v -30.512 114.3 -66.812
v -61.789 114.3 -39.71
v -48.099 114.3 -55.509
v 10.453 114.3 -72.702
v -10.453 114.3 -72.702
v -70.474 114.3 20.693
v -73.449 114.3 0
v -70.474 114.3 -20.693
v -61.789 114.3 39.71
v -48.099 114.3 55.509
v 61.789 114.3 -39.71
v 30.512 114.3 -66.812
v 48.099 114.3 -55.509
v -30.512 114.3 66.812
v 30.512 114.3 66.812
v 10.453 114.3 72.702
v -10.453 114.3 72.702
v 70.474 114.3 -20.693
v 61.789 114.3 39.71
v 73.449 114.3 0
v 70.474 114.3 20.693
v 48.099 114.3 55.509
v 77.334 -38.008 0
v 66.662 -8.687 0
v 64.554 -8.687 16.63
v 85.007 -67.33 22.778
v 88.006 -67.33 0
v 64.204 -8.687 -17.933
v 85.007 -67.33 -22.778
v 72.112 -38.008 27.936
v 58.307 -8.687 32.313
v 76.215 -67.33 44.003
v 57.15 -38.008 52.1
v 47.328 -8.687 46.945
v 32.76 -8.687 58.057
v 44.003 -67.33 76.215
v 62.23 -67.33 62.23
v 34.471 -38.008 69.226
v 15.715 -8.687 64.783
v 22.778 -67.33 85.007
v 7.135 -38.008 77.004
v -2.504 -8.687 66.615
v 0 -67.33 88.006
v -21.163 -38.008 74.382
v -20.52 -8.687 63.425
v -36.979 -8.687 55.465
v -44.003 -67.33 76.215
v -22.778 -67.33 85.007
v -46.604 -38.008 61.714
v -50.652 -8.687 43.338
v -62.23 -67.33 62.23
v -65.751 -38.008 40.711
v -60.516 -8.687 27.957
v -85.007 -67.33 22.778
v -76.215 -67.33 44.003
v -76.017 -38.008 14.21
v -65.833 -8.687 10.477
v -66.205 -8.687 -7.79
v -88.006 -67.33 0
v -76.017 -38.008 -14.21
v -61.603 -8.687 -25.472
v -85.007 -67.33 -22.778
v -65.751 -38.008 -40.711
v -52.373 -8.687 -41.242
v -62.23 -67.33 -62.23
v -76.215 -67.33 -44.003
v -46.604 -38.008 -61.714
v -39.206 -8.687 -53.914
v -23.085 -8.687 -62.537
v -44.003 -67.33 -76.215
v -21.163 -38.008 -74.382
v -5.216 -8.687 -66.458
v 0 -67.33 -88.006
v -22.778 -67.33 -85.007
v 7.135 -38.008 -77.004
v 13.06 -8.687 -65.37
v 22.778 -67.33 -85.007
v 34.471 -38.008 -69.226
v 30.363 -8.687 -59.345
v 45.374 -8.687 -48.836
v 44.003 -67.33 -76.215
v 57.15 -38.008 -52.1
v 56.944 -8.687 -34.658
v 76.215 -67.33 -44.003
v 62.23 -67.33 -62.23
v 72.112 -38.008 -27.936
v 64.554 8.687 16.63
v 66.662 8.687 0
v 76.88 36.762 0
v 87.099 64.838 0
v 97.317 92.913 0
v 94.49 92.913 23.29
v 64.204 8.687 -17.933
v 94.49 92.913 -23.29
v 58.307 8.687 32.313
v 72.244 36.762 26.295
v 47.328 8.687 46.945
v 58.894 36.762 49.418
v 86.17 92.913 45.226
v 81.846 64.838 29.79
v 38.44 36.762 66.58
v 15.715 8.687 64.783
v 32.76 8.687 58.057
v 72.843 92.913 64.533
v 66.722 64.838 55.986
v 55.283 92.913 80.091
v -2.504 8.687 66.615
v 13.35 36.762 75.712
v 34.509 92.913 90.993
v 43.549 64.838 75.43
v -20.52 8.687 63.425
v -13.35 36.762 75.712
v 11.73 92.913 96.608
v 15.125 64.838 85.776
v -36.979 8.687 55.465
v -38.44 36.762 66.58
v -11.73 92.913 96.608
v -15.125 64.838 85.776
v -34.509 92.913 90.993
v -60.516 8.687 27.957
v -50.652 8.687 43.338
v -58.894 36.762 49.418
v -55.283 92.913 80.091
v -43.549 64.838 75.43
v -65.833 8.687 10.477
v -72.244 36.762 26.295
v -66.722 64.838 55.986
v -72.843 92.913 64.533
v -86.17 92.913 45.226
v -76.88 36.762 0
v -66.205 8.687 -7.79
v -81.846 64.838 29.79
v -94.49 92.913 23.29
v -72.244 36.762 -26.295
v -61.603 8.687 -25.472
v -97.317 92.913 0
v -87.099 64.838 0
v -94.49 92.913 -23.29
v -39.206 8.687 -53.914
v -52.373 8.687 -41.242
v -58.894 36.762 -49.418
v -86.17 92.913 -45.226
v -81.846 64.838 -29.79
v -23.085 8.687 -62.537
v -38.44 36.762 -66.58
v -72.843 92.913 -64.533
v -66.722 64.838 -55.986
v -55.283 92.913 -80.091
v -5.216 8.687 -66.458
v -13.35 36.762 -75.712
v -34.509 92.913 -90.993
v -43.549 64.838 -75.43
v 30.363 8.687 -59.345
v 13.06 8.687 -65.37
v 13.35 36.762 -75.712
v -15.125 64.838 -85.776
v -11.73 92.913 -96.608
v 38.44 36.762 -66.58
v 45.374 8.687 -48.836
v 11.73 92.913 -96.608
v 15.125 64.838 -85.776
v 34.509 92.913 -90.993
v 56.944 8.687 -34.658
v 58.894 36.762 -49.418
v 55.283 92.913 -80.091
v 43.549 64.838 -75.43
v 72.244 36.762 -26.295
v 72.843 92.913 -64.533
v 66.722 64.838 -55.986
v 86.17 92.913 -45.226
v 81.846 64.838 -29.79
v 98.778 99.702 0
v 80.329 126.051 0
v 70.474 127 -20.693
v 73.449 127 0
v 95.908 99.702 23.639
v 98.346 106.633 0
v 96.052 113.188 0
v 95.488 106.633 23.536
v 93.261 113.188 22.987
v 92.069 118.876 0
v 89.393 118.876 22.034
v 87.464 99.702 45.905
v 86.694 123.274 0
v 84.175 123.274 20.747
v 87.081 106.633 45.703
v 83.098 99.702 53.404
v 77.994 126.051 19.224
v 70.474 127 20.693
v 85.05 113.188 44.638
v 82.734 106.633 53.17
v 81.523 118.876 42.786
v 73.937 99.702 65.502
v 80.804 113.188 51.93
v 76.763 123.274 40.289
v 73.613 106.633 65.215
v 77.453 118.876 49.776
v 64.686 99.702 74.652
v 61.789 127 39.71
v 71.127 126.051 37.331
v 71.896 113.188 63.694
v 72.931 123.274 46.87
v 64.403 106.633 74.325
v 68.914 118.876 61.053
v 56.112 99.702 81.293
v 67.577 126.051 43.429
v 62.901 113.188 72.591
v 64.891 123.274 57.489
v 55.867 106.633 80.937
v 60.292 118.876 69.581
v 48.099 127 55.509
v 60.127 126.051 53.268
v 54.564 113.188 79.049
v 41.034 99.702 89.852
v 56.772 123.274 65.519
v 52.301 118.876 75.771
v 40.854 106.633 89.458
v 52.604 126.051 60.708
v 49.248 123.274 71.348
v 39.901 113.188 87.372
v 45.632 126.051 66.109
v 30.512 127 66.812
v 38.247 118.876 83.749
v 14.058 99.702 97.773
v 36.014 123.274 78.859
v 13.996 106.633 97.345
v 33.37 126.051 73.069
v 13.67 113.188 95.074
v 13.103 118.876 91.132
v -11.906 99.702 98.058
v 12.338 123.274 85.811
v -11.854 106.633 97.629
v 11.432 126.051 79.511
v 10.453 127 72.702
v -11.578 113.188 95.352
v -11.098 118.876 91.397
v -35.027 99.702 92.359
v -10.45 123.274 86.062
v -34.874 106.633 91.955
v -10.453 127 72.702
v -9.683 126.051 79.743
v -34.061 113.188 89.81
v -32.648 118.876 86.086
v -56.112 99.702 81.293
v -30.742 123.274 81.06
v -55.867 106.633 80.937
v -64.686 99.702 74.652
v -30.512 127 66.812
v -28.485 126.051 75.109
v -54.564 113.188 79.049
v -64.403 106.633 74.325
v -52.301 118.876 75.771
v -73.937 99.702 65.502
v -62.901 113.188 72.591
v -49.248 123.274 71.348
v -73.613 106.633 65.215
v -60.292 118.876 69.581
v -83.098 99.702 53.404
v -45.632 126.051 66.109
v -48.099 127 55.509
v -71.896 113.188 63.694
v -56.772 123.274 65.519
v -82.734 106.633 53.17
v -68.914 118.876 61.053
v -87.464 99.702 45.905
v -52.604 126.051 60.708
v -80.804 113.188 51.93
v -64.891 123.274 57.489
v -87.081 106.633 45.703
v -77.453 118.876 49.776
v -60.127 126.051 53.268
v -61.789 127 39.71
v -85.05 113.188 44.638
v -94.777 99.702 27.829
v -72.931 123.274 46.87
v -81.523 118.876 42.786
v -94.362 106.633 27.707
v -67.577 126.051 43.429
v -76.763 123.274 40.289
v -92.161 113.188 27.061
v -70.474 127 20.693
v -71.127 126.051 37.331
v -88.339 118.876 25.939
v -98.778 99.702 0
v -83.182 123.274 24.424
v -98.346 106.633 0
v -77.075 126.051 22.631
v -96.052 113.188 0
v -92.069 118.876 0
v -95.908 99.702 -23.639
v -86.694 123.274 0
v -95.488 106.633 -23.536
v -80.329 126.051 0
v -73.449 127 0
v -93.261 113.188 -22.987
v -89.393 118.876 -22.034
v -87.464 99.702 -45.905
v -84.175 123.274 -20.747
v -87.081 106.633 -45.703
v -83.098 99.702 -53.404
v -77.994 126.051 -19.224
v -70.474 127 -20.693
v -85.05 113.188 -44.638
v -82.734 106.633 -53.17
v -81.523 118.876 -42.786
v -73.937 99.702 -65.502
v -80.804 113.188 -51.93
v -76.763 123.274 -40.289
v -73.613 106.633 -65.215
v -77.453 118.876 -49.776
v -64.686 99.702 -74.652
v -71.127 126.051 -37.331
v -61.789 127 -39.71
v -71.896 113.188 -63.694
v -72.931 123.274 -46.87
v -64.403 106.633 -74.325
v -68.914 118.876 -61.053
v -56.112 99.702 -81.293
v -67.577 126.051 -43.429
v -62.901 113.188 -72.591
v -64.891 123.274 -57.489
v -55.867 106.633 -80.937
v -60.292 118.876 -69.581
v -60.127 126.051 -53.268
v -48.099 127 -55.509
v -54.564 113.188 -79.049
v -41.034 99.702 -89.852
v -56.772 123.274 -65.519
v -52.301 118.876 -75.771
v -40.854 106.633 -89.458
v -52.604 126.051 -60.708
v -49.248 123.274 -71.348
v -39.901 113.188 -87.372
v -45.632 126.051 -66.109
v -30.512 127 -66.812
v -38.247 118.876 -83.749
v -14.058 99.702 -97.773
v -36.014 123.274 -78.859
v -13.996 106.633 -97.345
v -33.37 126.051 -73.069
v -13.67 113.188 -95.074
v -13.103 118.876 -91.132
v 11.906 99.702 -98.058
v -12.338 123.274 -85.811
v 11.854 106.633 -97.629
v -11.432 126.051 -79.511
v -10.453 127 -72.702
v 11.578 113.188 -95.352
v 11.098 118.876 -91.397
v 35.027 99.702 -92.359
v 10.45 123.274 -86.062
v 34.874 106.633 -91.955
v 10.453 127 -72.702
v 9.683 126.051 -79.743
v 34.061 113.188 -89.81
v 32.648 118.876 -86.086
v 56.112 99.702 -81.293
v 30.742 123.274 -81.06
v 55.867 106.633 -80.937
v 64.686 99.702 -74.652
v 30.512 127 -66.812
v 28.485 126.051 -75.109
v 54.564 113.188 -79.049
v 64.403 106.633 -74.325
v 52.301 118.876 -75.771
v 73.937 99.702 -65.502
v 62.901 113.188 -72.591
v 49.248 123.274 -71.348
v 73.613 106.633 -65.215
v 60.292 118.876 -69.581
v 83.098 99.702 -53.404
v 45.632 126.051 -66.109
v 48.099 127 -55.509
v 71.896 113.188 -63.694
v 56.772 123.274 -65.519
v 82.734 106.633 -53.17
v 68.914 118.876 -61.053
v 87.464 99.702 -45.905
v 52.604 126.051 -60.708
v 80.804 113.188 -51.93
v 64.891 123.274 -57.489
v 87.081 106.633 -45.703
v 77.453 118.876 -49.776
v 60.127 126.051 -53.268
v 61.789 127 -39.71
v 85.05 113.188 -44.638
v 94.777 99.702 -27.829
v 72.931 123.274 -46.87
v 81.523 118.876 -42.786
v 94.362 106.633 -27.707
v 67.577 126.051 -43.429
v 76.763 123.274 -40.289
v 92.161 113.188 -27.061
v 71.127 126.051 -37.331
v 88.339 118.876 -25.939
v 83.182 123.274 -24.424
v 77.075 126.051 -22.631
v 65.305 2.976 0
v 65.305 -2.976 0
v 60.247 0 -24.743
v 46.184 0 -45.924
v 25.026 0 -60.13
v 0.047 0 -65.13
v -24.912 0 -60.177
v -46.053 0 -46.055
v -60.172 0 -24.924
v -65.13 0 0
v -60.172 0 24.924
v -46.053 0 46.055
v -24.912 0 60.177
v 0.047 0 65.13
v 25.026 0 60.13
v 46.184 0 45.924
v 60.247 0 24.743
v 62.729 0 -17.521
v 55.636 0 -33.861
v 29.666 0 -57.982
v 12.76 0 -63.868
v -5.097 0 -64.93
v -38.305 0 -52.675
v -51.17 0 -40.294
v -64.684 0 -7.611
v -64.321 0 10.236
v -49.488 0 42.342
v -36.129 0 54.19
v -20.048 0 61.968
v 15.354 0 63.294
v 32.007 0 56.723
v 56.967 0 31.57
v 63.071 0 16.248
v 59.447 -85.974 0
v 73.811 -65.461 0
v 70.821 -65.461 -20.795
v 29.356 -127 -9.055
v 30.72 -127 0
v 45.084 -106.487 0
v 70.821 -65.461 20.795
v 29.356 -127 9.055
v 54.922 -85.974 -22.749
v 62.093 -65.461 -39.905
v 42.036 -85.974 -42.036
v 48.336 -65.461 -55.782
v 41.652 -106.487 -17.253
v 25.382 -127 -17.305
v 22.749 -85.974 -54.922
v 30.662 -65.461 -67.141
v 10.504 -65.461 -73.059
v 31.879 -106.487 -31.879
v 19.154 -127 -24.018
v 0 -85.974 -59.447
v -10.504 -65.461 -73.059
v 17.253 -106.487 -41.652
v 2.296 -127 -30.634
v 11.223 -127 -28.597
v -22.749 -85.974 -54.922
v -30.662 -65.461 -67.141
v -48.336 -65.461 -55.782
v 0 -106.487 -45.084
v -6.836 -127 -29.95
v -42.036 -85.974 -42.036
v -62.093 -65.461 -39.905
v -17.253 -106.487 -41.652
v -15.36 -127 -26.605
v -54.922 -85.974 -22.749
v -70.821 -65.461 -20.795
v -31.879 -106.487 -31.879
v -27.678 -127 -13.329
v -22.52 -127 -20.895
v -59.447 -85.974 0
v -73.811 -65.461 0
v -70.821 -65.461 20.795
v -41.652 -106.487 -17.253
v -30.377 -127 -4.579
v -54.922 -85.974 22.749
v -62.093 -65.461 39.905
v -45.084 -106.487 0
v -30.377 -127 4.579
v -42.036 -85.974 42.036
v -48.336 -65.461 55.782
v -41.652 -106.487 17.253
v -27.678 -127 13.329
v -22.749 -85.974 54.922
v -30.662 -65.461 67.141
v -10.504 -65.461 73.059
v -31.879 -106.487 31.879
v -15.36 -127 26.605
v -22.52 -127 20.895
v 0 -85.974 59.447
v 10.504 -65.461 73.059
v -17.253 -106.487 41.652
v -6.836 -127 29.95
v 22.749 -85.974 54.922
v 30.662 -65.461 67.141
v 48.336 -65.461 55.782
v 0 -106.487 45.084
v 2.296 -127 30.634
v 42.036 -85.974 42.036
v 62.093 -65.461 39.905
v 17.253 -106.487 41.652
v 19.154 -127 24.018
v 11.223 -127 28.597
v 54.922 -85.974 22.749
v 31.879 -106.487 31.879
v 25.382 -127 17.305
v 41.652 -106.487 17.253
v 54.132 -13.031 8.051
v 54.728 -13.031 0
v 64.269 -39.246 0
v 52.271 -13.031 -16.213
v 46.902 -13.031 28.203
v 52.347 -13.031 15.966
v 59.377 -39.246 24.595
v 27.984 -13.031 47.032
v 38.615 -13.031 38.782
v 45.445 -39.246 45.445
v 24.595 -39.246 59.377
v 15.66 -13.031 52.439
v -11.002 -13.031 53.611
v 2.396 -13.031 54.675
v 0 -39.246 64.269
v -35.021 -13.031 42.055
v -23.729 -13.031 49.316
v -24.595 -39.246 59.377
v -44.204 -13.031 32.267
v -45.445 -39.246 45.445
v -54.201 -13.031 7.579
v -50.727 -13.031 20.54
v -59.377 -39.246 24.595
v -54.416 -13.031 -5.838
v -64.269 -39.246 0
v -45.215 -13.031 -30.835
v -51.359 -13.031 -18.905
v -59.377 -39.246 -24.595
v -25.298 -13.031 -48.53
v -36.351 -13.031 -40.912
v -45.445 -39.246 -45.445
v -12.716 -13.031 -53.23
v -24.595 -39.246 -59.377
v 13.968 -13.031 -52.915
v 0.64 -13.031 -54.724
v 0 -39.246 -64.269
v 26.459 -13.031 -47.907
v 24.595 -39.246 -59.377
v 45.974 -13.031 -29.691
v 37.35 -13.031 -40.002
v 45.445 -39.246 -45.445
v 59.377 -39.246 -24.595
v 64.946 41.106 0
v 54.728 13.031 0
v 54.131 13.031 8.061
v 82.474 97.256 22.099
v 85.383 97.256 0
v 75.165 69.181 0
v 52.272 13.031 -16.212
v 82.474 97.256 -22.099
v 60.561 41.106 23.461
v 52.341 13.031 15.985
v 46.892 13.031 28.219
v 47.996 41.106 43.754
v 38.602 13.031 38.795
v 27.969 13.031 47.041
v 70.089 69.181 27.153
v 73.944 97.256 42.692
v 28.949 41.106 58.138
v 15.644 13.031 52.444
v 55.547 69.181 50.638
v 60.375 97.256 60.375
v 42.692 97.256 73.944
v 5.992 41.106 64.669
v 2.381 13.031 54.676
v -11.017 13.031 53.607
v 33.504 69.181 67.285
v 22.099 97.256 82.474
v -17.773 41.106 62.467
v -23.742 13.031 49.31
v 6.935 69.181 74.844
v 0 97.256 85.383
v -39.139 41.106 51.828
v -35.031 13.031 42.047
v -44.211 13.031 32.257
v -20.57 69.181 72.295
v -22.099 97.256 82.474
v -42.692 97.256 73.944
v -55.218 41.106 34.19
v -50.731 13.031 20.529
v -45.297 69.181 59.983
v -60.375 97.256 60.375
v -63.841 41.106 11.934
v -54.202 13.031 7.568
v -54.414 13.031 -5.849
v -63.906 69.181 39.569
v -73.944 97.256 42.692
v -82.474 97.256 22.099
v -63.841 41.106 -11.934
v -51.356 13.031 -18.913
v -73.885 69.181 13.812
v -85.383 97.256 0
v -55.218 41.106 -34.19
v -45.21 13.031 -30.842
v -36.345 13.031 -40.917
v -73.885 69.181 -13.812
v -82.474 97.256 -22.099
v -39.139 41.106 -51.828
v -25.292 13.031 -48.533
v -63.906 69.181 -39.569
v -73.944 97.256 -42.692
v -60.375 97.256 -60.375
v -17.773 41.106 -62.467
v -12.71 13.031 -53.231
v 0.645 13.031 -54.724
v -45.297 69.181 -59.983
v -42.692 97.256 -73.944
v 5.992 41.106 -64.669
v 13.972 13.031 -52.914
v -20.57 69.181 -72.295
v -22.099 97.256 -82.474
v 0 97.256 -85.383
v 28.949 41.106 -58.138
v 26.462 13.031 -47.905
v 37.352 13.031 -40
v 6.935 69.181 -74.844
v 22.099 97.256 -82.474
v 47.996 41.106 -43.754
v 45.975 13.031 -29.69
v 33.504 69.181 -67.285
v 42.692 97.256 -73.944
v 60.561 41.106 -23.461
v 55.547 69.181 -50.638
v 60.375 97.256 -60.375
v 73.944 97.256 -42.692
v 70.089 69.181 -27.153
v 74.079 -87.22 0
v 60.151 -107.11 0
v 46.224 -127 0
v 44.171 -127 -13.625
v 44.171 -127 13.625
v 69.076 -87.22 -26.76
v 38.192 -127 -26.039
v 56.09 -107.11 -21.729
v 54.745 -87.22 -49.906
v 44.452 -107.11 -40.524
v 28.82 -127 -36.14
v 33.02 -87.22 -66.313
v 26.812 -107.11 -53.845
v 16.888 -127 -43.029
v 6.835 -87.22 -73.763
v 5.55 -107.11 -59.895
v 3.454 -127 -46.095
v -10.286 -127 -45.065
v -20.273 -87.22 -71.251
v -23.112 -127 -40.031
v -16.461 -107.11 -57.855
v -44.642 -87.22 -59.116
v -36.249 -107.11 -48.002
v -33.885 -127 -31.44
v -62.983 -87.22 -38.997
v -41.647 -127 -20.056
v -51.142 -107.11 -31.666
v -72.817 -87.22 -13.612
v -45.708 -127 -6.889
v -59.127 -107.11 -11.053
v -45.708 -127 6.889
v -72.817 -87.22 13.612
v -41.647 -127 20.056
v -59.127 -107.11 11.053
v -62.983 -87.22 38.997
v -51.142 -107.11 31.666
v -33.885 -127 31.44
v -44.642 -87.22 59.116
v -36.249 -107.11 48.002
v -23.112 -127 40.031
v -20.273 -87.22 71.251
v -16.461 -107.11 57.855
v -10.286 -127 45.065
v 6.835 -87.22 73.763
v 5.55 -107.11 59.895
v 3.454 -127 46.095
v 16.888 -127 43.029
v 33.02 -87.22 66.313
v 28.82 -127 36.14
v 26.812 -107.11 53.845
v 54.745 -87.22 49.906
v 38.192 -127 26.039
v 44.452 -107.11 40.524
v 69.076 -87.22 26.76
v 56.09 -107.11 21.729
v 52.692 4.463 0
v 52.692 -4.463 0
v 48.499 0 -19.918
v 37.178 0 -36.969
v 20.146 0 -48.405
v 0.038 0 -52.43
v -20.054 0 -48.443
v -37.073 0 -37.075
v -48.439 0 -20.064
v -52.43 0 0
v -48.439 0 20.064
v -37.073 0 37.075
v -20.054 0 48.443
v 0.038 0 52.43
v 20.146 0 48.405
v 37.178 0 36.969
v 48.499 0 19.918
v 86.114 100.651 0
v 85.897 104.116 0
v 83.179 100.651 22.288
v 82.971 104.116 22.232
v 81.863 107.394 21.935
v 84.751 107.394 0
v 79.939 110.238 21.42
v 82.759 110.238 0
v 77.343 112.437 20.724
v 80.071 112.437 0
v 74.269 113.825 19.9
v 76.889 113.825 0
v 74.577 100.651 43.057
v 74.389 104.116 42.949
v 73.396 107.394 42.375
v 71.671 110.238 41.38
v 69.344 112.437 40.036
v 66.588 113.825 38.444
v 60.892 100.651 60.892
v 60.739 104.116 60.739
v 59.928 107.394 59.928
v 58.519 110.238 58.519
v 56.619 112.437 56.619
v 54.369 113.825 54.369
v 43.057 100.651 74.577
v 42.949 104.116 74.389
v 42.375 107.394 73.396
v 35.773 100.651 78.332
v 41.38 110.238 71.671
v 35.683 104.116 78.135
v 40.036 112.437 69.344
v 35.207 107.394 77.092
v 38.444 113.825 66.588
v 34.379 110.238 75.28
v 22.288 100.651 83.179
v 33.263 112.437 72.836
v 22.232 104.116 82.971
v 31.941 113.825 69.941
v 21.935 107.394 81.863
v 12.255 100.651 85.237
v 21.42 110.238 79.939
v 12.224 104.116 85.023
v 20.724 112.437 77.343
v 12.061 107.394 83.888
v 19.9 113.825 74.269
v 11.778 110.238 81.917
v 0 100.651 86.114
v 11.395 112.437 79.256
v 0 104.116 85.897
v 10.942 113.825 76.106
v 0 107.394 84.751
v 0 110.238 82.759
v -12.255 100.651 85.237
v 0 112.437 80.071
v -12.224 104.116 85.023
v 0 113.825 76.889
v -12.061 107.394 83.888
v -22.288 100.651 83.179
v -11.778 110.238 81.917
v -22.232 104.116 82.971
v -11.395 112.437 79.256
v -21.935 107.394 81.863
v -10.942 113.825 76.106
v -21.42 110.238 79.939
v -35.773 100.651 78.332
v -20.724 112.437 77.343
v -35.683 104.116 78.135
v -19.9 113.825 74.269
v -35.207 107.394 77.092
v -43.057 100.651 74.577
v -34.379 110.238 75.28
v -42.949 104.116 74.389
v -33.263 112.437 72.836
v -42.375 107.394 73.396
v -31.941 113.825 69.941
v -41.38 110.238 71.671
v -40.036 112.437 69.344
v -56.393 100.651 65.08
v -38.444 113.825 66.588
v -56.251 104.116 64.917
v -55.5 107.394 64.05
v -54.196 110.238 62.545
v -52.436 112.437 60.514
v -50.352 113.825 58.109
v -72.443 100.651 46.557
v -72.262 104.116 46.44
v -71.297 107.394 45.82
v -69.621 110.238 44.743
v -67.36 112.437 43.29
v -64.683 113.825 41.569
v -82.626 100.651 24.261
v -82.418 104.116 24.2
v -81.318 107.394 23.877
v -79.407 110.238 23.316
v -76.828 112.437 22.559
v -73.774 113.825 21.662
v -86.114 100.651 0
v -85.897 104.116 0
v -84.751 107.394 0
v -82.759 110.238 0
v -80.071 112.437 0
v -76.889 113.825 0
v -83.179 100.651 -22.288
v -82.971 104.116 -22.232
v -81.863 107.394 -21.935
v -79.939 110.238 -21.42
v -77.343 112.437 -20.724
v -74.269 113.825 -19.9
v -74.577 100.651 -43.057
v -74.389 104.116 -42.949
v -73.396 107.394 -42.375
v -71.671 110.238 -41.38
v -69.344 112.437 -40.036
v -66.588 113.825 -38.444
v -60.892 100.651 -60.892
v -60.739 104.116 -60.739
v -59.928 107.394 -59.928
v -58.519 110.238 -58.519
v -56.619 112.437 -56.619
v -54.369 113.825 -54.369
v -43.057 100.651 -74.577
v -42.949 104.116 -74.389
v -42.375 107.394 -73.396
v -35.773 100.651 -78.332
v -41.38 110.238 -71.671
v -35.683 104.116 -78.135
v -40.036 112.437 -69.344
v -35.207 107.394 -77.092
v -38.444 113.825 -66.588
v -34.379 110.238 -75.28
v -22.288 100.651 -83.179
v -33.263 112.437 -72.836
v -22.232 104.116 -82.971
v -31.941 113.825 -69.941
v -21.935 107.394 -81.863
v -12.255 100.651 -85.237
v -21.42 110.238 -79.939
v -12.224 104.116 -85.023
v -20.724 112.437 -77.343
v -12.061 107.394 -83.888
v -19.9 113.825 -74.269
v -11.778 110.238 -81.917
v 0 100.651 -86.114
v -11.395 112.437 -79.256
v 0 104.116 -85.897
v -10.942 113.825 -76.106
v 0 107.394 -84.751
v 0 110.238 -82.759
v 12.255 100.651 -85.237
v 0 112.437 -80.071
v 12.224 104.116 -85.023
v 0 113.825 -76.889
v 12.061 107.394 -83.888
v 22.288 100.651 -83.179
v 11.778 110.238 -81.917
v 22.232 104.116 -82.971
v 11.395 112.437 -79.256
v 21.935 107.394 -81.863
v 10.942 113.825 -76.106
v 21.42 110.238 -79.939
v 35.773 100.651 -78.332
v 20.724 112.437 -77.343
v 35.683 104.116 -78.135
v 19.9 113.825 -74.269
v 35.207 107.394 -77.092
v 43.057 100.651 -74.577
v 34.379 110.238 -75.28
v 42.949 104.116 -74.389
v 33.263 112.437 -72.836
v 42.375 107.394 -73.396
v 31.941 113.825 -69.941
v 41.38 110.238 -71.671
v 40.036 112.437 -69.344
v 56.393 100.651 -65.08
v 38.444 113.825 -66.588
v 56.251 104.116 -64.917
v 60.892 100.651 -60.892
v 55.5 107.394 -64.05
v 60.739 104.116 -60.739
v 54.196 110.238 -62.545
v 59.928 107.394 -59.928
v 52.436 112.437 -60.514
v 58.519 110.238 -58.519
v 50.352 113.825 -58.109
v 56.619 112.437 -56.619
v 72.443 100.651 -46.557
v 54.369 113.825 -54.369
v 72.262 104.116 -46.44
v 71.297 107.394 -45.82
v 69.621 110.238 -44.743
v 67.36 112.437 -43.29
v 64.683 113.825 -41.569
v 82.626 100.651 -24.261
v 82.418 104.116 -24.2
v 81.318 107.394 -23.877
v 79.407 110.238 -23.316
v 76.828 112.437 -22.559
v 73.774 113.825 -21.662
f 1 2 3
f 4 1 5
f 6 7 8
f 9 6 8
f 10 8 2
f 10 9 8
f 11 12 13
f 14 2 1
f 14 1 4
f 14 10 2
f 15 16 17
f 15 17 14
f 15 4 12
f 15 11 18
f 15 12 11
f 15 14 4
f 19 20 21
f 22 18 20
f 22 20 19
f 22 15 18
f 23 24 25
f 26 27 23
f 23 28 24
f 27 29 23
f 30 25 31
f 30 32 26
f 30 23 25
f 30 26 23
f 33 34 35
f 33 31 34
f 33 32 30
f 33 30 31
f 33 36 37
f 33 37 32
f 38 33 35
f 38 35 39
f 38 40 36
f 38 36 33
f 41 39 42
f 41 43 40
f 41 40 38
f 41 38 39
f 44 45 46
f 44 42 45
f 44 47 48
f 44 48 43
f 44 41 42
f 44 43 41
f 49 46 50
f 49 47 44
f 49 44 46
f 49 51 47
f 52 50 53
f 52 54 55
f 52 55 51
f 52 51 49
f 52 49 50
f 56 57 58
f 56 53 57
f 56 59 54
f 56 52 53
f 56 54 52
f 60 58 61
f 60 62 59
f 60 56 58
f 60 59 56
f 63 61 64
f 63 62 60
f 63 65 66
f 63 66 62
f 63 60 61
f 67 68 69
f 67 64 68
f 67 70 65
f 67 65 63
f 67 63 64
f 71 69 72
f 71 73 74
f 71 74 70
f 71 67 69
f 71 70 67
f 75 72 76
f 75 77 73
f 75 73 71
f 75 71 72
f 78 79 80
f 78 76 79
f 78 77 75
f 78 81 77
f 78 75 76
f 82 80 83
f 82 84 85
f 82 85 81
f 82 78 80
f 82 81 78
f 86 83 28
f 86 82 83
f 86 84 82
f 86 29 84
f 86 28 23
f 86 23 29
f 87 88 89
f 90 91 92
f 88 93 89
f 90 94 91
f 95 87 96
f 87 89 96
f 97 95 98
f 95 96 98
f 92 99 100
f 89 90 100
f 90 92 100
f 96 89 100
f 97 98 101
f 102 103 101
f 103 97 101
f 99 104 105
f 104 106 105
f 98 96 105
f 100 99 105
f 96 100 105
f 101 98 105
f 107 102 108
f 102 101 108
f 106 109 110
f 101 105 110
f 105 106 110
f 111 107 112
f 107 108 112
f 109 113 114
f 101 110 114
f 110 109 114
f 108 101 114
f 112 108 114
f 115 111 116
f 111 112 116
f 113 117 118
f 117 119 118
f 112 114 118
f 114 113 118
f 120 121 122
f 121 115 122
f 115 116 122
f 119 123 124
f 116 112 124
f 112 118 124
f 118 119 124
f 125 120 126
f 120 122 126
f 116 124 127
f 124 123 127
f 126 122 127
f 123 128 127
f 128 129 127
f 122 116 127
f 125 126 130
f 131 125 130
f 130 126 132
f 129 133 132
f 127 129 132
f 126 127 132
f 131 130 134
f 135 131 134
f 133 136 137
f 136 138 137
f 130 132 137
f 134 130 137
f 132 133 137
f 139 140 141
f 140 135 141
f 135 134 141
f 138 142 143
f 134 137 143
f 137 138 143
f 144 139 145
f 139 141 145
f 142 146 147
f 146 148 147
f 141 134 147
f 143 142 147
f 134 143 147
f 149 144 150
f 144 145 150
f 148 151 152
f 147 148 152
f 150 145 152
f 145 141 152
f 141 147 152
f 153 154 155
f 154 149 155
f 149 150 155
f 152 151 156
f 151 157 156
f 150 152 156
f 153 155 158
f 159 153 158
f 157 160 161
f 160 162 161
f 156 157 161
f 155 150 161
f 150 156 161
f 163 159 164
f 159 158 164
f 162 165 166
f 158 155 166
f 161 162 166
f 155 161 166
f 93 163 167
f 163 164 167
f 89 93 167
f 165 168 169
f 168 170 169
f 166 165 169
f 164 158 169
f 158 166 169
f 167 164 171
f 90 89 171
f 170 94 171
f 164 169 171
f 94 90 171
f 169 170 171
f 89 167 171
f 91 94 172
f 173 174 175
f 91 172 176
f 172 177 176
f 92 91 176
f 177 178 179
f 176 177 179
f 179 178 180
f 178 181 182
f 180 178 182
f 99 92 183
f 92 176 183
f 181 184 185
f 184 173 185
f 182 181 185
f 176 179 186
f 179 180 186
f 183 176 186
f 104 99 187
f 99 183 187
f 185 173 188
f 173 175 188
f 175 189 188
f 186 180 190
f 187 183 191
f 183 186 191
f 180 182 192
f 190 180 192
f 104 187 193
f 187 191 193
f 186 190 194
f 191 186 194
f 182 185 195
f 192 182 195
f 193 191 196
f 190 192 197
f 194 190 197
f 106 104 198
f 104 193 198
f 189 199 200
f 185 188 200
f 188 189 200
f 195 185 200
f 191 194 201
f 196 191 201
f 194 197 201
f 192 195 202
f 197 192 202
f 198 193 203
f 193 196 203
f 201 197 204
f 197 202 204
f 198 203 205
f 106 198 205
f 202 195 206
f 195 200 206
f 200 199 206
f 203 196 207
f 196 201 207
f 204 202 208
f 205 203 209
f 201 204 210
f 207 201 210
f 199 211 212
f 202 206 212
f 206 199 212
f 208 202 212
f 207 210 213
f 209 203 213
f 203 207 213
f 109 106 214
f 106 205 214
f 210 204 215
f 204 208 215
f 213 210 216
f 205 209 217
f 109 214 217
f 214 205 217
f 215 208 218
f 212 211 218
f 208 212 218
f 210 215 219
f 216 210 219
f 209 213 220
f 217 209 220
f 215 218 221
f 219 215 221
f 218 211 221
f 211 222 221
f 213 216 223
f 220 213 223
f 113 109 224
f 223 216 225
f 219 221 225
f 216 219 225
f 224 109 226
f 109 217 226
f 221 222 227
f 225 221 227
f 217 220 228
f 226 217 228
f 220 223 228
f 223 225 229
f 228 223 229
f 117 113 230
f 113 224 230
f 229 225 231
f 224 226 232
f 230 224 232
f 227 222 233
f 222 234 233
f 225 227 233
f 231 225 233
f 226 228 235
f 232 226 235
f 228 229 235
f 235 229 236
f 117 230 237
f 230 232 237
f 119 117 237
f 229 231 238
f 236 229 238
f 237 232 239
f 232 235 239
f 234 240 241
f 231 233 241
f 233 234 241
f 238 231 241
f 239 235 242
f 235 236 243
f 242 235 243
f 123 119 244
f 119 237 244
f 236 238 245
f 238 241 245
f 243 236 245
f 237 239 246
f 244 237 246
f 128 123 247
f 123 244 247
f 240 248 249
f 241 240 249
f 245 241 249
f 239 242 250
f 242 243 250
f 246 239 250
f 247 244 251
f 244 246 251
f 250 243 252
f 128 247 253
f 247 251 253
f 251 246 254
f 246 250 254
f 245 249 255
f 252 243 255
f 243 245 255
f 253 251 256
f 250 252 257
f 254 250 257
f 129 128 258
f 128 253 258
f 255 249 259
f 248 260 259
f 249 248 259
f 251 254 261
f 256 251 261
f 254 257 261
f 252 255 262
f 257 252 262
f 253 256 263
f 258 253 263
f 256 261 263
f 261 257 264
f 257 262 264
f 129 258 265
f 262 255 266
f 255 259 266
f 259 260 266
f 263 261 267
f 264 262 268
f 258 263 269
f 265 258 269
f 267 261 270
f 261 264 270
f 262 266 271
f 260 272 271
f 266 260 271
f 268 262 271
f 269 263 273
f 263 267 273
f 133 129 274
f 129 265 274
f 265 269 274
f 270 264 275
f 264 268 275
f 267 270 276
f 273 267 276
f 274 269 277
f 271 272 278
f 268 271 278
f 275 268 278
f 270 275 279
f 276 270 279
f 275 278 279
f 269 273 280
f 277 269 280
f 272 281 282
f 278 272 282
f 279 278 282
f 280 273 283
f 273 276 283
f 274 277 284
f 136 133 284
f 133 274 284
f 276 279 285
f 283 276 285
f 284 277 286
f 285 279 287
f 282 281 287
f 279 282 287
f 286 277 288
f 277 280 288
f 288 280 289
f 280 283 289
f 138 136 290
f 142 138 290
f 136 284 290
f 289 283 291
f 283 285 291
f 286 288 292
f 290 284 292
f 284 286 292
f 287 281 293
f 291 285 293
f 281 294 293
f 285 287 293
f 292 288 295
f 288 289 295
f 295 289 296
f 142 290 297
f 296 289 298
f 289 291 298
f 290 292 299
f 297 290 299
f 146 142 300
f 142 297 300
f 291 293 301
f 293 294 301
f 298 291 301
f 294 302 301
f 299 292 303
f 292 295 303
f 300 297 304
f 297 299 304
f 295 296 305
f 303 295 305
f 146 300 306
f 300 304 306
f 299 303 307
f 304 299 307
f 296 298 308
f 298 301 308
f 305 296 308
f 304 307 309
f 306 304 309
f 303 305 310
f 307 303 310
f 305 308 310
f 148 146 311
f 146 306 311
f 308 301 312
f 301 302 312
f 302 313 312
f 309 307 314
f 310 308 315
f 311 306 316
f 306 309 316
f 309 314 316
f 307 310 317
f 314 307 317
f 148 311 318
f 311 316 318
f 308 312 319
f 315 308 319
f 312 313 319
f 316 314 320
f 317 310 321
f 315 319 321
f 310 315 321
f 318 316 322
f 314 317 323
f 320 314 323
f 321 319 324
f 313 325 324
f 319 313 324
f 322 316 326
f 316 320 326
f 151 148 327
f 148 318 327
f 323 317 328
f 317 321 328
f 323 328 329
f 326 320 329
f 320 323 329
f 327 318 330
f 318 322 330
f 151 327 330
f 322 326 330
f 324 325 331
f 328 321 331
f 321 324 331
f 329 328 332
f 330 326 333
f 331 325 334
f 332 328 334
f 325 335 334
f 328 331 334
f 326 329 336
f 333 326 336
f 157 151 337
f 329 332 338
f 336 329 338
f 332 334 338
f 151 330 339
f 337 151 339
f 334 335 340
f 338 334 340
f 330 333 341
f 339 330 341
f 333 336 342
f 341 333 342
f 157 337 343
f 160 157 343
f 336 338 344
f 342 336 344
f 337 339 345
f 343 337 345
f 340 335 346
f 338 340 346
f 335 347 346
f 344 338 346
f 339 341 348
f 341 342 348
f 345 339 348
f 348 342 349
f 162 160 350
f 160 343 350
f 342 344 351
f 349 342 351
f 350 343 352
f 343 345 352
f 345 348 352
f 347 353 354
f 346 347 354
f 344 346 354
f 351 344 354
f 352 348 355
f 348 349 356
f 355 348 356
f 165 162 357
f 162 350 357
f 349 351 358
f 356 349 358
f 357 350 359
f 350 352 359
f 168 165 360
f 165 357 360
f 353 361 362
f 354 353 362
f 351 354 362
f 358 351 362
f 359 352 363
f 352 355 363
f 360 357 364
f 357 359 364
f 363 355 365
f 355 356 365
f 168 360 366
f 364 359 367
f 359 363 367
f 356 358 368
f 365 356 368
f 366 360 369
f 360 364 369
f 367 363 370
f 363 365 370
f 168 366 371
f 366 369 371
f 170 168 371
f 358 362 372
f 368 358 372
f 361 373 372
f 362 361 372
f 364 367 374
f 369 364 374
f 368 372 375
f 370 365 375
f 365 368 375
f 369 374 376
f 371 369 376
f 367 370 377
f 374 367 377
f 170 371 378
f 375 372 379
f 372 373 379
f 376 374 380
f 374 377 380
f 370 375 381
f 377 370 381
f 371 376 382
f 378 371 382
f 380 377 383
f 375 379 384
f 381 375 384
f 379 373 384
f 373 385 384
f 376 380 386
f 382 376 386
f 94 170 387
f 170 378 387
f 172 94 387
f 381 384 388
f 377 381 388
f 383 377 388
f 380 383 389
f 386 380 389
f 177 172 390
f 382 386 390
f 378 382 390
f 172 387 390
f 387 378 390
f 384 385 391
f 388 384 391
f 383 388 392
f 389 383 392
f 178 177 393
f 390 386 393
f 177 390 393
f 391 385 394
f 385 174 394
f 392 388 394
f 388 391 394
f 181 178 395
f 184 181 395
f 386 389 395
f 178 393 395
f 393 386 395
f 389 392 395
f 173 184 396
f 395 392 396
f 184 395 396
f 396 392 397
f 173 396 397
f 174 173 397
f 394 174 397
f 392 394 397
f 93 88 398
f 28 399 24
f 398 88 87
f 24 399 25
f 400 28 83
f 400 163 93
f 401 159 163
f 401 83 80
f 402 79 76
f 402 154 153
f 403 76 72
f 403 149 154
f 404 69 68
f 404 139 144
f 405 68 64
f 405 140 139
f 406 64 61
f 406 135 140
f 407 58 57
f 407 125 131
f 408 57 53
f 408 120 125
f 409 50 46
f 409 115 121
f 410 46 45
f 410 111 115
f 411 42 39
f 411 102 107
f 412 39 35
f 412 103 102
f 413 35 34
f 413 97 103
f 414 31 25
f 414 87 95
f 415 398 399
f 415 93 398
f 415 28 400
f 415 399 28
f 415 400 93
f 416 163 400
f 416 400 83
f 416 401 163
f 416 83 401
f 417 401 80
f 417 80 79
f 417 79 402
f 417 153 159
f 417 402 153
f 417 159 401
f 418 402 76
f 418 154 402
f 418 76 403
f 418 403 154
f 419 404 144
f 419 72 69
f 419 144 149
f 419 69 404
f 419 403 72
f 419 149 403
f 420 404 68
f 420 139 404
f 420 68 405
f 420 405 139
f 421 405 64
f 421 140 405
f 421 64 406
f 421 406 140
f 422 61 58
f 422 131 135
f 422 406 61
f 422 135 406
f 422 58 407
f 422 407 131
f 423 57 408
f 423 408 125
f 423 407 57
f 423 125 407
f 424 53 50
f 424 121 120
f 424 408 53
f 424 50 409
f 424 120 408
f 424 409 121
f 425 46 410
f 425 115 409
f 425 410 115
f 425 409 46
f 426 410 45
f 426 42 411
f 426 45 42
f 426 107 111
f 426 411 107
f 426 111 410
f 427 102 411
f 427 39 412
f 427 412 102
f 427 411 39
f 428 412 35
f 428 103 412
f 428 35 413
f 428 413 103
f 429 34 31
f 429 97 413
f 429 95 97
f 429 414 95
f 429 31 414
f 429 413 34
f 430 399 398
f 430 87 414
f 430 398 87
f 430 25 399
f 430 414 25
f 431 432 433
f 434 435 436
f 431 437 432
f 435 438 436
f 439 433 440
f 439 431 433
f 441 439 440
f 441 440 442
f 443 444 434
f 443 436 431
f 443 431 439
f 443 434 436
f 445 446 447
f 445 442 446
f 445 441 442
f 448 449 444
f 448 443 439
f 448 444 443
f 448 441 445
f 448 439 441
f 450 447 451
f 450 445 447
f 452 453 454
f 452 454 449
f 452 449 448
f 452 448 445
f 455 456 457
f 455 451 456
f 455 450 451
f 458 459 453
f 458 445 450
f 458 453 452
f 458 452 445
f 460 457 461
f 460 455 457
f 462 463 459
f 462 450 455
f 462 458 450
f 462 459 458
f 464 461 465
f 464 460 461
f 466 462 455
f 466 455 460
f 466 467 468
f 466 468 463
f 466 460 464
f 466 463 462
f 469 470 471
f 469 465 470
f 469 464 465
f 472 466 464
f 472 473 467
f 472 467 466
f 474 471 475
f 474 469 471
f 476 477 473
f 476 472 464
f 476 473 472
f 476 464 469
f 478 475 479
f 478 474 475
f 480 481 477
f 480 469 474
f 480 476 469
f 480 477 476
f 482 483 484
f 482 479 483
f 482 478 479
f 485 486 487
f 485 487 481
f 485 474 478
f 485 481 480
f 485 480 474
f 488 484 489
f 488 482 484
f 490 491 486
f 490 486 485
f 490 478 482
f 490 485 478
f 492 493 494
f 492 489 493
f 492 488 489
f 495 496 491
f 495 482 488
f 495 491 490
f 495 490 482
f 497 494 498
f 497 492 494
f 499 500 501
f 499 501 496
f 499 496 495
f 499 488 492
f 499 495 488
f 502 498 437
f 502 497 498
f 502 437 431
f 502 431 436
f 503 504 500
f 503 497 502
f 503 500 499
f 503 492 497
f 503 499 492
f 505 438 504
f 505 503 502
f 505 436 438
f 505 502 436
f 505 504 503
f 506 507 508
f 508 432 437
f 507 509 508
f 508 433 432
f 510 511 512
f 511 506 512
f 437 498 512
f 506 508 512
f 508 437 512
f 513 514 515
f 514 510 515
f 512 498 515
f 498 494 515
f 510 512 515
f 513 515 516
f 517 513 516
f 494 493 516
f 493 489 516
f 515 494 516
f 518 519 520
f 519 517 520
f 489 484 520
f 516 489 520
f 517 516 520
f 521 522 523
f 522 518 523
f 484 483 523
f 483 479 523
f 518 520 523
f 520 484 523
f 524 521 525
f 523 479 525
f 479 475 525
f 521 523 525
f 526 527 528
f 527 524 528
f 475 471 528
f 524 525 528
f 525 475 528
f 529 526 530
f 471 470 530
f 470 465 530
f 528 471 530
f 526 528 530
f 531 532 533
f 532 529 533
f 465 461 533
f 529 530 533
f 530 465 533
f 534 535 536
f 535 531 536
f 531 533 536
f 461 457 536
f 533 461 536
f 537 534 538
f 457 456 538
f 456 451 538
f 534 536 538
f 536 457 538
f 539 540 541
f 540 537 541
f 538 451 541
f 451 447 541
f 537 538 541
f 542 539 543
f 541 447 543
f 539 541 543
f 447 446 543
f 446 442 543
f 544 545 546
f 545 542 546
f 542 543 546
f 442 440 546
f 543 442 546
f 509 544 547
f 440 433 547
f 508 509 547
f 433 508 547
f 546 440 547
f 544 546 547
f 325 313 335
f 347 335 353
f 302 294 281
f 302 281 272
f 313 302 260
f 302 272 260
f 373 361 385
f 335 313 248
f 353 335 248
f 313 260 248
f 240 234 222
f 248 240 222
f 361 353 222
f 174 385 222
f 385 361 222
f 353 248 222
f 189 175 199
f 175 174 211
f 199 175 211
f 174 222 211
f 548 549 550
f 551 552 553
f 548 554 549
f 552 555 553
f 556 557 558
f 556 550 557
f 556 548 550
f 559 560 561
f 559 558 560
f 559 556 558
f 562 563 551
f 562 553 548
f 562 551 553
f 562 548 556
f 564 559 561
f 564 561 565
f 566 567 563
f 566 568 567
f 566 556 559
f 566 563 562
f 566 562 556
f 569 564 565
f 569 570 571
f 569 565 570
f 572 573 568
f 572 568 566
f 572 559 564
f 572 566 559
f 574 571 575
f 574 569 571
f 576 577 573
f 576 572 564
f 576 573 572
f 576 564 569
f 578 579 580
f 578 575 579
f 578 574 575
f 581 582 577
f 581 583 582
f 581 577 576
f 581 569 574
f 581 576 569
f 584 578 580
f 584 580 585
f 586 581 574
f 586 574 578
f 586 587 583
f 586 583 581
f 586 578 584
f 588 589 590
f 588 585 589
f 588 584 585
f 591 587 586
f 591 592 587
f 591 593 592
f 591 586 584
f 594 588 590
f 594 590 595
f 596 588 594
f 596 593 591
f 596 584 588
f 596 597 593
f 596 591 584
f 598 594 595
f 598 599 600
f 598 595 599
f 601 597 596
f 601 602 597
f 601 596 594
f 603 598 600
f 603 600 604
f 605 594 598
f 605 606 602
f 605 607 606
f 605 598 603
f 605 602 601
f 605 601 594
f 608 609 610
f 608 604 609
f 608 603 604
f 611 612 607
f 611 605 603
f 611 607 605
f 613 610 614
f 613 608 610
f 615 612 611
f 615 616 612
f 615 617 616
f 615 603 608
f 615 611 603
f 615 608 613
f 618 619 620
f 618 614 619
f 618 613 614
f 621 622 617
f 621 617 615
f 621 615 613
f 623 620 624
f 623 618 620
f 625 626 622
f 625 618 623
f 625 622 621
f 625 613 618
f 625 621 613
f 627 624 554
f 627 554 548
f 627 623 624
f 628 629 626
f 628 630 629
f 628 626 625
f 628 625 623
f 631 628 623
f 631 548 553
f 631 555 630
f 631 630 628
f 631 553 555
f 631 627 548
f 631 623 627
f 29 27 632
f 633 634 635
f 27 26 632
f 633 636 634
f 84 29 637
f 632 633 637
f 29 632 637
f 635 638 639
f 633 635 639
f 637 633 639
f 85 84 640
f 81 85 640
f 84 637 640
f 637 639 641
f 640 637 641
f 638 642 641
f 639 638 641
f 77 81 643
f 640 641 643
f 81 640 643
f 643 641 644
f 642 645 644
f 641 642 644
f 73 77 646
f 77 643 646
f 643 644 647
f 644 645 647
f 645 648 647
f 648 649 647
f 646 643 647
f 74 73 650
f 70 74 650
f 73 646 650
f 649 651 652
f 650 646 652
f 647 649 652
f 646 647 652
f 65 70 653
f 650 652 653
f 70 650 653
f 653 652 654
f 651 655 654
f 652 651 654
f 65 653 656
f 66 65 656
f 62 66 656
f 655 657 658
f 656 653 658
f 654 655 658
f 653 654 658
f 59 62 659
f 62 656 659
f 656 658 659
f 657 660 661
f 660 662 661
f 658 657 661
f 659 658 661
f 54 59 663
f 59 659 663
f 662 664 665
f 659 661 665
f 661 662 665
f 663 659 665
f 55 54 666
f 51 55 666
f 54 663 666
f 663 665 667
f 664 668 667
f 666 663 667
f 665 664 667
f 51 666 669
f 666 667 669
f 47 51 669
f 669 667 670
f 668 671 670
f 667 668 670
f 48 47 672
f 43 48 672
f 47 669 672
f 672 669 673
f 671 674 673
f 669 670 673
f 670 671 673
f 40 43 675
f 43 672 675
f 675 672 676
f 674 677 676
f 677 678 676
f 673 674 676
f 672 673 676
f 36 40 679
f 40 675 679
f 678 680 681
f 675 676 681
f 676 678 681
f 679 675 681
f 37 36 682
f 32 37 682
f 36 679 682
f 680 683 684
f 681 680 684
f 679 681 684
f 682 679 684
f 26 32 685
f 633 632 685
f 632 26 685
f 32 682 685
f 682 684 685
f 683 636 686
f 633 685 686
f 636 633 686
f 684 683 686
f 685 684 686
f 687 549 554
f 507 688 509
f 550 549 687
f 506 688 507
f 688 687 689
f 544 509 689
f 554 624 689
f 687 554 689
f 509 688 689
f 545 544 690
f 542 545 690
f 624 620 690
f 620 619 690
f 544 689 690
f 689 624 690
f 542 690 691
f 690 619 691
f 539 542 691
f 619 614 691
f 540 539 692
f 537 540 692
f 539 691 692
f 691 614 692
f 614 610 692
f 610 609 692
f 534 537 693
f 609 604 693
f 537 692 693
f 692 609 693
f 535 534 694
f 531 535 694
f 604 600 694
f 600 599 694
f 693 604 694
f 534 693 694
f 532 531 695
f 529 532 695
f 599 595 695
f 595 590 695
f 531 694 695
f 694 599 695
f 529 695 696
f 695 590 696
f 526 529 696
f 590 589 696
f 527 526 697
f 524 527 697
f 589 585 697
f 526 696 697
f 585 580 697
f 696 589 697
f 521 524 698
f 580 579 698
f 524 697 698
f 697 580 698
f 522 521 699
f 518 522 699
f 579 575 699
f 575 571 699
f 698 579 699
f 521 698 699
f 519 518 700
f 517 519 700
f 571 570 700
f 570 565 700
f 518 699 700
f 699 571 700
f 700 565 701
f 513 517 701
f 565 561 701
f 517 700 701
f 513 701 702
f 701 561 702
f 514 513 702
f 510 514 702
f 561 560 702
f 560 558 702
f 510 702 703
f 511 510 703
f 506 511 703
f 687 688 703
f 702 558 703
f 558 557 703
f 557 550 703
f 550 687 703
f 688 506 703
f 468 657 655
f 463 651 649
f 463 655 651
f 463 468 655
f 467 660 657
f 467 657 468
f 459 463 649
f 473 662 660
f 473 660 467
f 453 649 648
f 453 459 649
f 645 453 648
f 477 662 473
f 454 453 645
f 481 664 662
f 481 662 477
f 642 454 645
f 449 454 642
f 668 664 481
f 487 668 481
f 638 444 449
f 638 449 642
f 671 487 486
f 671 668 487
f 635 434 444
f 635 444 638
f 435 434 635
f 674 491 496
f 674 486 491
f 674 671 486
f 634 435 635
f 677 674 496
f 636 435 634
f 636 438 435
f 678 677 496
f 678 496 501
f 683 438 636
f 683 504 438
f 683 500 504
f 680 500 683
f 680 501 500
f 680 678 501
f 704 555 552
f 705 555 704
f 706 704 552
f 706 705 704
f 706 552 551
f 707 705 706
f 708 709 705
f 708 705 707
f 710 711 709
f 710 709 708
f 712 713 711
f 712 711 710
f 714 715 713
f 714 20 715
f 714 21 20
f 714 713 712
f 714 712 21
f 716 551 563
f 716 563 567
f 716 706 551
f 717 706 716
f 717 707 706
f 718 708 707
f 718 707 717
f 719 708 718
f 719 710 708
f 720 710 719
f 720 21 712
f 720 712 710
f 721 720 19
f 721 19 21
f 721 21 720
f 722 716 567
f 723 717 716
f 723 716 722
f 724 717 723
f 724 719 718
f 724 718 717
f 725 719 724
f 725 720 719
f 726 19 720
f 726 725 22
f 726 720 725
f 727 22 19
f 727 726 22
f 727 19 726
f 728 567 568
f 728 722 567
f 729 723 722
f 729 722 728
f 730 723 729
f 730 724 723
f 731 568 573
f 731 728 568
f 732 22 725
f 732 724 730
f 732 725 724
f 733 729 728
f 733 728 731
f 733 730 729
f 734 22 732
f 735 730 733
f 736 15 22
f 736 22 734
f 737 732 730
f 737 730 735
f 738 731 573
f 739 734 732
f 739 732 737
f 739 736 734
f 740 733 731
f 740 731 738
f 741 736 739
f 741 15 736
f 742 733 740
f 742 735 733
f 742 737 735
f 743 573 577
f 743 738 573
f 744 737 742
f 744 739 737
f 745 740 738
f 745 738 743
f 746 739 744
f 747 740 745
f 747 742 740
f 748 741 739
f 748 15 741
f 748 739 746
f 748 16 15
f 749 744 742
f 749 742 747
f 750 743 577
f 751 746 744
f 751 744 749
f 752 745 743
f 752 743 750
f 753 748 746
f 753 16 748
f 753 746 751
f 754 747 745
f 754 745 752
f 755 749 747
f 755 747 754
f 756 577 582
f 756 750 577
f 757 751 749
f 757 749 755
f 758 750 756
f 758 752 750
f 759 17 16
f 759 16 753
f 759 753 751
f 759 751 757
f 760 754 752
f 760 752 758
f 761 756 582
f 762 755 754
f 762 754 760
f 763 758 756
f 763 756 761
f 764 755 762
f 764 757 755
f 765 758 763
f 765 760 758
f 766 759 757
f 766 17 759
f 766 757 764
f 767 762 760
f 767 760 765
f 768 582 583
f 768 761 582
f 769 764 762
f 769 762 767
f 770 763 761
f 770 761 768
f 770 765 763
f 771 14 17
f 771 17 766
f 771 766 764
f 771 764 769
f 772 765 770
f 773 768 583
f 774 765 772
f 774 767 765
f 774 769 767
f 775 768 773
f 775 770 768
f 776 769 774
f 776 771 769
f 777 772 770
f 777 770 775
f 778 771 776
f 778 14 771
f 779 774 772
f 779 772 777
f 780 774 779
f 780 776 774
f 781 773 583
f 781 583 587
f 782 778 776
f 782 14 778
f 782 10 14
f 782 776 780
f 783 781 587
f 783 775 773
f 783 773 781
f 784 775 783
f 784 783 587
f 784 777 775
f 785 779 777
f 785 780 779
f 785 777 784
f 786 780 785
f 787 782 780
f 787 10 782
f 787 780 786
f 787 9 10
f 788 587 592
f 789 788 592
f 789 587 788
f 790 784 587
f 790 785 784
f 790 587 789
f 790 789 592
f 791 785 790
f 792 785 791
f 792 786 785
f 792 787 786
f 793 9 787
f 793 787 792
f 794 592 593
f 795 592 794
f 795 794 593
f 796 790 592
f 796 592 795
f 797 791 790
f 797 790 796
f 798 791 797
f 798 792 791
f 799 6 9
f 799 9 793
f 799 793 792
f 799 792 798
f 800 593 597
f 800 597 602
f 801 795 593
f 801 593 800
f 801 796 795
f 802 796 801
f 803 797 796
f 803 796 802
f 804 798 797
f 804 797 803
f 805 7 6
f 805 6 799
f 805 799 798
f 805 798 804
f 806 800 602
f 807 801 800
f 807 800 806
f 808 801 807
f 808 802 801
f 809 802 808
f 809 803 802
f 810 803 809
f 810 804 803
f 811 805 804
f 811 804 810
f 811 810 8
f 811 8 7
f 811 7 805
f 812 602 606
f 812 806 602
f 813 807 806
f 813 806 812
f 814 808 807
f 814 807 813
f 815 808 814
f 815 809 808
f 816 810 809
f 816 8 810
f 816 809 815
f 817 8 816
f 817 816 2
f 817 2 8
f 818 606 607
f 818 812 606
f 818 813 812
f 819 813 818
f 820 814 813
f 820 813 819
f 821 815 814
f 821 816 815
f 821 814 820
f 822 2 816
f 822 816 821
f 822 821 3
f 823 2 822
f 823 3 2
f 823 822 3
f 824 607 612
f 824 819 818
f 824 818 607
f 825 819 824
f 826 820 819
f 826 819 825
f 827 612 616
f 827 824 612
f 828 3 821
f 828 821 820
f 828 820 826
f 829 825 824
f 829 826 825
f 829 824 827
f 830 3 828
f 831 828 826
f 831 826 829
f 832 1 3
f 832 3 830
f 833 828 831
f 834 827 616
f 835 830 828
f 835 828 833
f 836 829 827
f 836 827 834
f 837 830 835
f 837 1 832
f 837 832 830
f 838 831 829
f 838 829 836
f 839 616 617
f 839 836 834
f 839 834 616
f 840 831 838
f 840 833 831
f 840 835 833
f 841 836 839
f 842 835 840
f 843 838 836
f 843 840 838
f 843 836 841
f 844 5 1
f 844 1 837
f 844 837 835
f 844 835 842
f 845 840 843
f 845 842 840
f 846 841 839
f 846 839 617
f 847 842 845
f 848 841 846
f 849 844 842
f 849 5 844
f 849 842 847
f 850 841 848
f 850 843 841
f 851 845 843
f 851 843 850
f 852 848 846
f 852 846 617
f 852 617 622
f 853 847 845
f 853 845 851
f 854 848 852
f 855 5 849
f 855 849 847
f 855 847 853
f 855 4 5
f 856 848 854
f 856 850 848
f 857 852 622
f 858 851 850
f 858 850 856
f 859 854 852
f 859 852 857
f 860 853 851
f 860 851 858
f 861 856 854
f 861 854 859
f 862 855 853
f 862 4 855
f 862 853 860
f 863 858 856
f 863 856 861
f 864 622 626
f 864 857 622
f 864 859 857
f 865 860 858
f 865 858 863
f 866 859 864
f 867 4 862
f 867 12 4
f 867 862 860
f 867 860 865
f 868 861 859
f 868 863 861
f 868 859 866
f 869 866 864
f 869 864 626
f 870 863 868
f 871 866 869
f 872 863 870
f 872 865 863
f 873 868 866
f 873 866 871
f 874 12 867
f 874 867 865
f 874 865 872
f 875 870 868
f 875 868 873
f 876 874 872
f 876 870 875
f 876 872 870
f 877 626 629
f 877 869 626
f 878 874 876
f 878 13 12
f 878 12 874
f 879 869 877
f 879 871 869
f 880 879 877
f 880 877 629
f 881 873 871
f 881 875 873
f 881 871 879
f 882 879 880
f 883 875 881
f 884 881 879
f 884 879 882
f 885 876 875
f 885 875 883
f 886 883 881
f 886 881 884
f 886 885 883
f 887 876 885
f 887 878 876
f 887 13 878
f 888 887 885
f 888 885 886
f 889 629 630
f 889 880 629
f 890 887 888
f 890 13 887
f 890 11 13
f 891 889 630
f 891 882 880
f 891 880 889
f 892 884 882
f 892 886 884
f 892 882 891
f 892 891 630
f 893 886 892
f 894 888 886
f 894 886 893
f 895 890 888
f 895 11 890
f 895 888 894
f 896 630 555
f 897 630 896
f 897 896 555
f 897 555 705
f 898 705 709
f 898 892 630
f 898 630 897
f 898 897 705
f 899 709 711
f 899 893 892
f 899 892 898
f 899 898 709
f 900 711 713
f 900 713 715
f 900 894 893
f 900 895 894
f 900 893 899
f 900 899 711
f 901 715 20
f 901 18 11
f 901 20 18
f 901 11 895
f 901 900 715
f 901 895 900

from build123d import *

# Parameters (mm, degrees)
F0_R     = 63.5
F1_DEPTH = 127
F1_TAPER = -20
F2_R     = 25.4
F4_T     = -12.7


# Not quite as in the source:
# - a fillet or chamfer that OpenCascade refuses, or shapes differently, is made with other operations: its cross-section is extruded or revolved along the edge and cut away or added


with BuildPart() as f1:
    # F0 (on Front) → F1 (new body, symmetric)
    with BuildSketch(Plane.XZ):
        Circle(F0_R)
    extrude(amount=F1_DEPTH, both=True, taper=F1_TAPER)

    # F2
    f2_edges = [f1.edges().sort_by_distance(p)[0] for p in [
        (-63.5, 0, 0),
        (-109.72422, 127, 0),
    ]]
    fillet(f2_edges, radius=F2_R)

    # F3: chamfer of 63.5 on 1 edges, made by hand

    # F3_s1 → F3_t2 (revolve, cut)
    with BuildSketch(Plane.XY):
        Polygon((88.0059406506, -67.3295185801), (46.2242197518, -127), (109.7242197518, -127), align=None)
    revolve(axis=Axis((0, -127, 0), (0, 1, 0)), mode=Mode.SUBTRACT)

    # F4
    f4_openings = [f1.faces().sort_by_distance(p)[0] for p in [
        (0, -127, 0),
    ]]
    offset(amount=F4_T, openings=f4_openings)


solid = f1.part
